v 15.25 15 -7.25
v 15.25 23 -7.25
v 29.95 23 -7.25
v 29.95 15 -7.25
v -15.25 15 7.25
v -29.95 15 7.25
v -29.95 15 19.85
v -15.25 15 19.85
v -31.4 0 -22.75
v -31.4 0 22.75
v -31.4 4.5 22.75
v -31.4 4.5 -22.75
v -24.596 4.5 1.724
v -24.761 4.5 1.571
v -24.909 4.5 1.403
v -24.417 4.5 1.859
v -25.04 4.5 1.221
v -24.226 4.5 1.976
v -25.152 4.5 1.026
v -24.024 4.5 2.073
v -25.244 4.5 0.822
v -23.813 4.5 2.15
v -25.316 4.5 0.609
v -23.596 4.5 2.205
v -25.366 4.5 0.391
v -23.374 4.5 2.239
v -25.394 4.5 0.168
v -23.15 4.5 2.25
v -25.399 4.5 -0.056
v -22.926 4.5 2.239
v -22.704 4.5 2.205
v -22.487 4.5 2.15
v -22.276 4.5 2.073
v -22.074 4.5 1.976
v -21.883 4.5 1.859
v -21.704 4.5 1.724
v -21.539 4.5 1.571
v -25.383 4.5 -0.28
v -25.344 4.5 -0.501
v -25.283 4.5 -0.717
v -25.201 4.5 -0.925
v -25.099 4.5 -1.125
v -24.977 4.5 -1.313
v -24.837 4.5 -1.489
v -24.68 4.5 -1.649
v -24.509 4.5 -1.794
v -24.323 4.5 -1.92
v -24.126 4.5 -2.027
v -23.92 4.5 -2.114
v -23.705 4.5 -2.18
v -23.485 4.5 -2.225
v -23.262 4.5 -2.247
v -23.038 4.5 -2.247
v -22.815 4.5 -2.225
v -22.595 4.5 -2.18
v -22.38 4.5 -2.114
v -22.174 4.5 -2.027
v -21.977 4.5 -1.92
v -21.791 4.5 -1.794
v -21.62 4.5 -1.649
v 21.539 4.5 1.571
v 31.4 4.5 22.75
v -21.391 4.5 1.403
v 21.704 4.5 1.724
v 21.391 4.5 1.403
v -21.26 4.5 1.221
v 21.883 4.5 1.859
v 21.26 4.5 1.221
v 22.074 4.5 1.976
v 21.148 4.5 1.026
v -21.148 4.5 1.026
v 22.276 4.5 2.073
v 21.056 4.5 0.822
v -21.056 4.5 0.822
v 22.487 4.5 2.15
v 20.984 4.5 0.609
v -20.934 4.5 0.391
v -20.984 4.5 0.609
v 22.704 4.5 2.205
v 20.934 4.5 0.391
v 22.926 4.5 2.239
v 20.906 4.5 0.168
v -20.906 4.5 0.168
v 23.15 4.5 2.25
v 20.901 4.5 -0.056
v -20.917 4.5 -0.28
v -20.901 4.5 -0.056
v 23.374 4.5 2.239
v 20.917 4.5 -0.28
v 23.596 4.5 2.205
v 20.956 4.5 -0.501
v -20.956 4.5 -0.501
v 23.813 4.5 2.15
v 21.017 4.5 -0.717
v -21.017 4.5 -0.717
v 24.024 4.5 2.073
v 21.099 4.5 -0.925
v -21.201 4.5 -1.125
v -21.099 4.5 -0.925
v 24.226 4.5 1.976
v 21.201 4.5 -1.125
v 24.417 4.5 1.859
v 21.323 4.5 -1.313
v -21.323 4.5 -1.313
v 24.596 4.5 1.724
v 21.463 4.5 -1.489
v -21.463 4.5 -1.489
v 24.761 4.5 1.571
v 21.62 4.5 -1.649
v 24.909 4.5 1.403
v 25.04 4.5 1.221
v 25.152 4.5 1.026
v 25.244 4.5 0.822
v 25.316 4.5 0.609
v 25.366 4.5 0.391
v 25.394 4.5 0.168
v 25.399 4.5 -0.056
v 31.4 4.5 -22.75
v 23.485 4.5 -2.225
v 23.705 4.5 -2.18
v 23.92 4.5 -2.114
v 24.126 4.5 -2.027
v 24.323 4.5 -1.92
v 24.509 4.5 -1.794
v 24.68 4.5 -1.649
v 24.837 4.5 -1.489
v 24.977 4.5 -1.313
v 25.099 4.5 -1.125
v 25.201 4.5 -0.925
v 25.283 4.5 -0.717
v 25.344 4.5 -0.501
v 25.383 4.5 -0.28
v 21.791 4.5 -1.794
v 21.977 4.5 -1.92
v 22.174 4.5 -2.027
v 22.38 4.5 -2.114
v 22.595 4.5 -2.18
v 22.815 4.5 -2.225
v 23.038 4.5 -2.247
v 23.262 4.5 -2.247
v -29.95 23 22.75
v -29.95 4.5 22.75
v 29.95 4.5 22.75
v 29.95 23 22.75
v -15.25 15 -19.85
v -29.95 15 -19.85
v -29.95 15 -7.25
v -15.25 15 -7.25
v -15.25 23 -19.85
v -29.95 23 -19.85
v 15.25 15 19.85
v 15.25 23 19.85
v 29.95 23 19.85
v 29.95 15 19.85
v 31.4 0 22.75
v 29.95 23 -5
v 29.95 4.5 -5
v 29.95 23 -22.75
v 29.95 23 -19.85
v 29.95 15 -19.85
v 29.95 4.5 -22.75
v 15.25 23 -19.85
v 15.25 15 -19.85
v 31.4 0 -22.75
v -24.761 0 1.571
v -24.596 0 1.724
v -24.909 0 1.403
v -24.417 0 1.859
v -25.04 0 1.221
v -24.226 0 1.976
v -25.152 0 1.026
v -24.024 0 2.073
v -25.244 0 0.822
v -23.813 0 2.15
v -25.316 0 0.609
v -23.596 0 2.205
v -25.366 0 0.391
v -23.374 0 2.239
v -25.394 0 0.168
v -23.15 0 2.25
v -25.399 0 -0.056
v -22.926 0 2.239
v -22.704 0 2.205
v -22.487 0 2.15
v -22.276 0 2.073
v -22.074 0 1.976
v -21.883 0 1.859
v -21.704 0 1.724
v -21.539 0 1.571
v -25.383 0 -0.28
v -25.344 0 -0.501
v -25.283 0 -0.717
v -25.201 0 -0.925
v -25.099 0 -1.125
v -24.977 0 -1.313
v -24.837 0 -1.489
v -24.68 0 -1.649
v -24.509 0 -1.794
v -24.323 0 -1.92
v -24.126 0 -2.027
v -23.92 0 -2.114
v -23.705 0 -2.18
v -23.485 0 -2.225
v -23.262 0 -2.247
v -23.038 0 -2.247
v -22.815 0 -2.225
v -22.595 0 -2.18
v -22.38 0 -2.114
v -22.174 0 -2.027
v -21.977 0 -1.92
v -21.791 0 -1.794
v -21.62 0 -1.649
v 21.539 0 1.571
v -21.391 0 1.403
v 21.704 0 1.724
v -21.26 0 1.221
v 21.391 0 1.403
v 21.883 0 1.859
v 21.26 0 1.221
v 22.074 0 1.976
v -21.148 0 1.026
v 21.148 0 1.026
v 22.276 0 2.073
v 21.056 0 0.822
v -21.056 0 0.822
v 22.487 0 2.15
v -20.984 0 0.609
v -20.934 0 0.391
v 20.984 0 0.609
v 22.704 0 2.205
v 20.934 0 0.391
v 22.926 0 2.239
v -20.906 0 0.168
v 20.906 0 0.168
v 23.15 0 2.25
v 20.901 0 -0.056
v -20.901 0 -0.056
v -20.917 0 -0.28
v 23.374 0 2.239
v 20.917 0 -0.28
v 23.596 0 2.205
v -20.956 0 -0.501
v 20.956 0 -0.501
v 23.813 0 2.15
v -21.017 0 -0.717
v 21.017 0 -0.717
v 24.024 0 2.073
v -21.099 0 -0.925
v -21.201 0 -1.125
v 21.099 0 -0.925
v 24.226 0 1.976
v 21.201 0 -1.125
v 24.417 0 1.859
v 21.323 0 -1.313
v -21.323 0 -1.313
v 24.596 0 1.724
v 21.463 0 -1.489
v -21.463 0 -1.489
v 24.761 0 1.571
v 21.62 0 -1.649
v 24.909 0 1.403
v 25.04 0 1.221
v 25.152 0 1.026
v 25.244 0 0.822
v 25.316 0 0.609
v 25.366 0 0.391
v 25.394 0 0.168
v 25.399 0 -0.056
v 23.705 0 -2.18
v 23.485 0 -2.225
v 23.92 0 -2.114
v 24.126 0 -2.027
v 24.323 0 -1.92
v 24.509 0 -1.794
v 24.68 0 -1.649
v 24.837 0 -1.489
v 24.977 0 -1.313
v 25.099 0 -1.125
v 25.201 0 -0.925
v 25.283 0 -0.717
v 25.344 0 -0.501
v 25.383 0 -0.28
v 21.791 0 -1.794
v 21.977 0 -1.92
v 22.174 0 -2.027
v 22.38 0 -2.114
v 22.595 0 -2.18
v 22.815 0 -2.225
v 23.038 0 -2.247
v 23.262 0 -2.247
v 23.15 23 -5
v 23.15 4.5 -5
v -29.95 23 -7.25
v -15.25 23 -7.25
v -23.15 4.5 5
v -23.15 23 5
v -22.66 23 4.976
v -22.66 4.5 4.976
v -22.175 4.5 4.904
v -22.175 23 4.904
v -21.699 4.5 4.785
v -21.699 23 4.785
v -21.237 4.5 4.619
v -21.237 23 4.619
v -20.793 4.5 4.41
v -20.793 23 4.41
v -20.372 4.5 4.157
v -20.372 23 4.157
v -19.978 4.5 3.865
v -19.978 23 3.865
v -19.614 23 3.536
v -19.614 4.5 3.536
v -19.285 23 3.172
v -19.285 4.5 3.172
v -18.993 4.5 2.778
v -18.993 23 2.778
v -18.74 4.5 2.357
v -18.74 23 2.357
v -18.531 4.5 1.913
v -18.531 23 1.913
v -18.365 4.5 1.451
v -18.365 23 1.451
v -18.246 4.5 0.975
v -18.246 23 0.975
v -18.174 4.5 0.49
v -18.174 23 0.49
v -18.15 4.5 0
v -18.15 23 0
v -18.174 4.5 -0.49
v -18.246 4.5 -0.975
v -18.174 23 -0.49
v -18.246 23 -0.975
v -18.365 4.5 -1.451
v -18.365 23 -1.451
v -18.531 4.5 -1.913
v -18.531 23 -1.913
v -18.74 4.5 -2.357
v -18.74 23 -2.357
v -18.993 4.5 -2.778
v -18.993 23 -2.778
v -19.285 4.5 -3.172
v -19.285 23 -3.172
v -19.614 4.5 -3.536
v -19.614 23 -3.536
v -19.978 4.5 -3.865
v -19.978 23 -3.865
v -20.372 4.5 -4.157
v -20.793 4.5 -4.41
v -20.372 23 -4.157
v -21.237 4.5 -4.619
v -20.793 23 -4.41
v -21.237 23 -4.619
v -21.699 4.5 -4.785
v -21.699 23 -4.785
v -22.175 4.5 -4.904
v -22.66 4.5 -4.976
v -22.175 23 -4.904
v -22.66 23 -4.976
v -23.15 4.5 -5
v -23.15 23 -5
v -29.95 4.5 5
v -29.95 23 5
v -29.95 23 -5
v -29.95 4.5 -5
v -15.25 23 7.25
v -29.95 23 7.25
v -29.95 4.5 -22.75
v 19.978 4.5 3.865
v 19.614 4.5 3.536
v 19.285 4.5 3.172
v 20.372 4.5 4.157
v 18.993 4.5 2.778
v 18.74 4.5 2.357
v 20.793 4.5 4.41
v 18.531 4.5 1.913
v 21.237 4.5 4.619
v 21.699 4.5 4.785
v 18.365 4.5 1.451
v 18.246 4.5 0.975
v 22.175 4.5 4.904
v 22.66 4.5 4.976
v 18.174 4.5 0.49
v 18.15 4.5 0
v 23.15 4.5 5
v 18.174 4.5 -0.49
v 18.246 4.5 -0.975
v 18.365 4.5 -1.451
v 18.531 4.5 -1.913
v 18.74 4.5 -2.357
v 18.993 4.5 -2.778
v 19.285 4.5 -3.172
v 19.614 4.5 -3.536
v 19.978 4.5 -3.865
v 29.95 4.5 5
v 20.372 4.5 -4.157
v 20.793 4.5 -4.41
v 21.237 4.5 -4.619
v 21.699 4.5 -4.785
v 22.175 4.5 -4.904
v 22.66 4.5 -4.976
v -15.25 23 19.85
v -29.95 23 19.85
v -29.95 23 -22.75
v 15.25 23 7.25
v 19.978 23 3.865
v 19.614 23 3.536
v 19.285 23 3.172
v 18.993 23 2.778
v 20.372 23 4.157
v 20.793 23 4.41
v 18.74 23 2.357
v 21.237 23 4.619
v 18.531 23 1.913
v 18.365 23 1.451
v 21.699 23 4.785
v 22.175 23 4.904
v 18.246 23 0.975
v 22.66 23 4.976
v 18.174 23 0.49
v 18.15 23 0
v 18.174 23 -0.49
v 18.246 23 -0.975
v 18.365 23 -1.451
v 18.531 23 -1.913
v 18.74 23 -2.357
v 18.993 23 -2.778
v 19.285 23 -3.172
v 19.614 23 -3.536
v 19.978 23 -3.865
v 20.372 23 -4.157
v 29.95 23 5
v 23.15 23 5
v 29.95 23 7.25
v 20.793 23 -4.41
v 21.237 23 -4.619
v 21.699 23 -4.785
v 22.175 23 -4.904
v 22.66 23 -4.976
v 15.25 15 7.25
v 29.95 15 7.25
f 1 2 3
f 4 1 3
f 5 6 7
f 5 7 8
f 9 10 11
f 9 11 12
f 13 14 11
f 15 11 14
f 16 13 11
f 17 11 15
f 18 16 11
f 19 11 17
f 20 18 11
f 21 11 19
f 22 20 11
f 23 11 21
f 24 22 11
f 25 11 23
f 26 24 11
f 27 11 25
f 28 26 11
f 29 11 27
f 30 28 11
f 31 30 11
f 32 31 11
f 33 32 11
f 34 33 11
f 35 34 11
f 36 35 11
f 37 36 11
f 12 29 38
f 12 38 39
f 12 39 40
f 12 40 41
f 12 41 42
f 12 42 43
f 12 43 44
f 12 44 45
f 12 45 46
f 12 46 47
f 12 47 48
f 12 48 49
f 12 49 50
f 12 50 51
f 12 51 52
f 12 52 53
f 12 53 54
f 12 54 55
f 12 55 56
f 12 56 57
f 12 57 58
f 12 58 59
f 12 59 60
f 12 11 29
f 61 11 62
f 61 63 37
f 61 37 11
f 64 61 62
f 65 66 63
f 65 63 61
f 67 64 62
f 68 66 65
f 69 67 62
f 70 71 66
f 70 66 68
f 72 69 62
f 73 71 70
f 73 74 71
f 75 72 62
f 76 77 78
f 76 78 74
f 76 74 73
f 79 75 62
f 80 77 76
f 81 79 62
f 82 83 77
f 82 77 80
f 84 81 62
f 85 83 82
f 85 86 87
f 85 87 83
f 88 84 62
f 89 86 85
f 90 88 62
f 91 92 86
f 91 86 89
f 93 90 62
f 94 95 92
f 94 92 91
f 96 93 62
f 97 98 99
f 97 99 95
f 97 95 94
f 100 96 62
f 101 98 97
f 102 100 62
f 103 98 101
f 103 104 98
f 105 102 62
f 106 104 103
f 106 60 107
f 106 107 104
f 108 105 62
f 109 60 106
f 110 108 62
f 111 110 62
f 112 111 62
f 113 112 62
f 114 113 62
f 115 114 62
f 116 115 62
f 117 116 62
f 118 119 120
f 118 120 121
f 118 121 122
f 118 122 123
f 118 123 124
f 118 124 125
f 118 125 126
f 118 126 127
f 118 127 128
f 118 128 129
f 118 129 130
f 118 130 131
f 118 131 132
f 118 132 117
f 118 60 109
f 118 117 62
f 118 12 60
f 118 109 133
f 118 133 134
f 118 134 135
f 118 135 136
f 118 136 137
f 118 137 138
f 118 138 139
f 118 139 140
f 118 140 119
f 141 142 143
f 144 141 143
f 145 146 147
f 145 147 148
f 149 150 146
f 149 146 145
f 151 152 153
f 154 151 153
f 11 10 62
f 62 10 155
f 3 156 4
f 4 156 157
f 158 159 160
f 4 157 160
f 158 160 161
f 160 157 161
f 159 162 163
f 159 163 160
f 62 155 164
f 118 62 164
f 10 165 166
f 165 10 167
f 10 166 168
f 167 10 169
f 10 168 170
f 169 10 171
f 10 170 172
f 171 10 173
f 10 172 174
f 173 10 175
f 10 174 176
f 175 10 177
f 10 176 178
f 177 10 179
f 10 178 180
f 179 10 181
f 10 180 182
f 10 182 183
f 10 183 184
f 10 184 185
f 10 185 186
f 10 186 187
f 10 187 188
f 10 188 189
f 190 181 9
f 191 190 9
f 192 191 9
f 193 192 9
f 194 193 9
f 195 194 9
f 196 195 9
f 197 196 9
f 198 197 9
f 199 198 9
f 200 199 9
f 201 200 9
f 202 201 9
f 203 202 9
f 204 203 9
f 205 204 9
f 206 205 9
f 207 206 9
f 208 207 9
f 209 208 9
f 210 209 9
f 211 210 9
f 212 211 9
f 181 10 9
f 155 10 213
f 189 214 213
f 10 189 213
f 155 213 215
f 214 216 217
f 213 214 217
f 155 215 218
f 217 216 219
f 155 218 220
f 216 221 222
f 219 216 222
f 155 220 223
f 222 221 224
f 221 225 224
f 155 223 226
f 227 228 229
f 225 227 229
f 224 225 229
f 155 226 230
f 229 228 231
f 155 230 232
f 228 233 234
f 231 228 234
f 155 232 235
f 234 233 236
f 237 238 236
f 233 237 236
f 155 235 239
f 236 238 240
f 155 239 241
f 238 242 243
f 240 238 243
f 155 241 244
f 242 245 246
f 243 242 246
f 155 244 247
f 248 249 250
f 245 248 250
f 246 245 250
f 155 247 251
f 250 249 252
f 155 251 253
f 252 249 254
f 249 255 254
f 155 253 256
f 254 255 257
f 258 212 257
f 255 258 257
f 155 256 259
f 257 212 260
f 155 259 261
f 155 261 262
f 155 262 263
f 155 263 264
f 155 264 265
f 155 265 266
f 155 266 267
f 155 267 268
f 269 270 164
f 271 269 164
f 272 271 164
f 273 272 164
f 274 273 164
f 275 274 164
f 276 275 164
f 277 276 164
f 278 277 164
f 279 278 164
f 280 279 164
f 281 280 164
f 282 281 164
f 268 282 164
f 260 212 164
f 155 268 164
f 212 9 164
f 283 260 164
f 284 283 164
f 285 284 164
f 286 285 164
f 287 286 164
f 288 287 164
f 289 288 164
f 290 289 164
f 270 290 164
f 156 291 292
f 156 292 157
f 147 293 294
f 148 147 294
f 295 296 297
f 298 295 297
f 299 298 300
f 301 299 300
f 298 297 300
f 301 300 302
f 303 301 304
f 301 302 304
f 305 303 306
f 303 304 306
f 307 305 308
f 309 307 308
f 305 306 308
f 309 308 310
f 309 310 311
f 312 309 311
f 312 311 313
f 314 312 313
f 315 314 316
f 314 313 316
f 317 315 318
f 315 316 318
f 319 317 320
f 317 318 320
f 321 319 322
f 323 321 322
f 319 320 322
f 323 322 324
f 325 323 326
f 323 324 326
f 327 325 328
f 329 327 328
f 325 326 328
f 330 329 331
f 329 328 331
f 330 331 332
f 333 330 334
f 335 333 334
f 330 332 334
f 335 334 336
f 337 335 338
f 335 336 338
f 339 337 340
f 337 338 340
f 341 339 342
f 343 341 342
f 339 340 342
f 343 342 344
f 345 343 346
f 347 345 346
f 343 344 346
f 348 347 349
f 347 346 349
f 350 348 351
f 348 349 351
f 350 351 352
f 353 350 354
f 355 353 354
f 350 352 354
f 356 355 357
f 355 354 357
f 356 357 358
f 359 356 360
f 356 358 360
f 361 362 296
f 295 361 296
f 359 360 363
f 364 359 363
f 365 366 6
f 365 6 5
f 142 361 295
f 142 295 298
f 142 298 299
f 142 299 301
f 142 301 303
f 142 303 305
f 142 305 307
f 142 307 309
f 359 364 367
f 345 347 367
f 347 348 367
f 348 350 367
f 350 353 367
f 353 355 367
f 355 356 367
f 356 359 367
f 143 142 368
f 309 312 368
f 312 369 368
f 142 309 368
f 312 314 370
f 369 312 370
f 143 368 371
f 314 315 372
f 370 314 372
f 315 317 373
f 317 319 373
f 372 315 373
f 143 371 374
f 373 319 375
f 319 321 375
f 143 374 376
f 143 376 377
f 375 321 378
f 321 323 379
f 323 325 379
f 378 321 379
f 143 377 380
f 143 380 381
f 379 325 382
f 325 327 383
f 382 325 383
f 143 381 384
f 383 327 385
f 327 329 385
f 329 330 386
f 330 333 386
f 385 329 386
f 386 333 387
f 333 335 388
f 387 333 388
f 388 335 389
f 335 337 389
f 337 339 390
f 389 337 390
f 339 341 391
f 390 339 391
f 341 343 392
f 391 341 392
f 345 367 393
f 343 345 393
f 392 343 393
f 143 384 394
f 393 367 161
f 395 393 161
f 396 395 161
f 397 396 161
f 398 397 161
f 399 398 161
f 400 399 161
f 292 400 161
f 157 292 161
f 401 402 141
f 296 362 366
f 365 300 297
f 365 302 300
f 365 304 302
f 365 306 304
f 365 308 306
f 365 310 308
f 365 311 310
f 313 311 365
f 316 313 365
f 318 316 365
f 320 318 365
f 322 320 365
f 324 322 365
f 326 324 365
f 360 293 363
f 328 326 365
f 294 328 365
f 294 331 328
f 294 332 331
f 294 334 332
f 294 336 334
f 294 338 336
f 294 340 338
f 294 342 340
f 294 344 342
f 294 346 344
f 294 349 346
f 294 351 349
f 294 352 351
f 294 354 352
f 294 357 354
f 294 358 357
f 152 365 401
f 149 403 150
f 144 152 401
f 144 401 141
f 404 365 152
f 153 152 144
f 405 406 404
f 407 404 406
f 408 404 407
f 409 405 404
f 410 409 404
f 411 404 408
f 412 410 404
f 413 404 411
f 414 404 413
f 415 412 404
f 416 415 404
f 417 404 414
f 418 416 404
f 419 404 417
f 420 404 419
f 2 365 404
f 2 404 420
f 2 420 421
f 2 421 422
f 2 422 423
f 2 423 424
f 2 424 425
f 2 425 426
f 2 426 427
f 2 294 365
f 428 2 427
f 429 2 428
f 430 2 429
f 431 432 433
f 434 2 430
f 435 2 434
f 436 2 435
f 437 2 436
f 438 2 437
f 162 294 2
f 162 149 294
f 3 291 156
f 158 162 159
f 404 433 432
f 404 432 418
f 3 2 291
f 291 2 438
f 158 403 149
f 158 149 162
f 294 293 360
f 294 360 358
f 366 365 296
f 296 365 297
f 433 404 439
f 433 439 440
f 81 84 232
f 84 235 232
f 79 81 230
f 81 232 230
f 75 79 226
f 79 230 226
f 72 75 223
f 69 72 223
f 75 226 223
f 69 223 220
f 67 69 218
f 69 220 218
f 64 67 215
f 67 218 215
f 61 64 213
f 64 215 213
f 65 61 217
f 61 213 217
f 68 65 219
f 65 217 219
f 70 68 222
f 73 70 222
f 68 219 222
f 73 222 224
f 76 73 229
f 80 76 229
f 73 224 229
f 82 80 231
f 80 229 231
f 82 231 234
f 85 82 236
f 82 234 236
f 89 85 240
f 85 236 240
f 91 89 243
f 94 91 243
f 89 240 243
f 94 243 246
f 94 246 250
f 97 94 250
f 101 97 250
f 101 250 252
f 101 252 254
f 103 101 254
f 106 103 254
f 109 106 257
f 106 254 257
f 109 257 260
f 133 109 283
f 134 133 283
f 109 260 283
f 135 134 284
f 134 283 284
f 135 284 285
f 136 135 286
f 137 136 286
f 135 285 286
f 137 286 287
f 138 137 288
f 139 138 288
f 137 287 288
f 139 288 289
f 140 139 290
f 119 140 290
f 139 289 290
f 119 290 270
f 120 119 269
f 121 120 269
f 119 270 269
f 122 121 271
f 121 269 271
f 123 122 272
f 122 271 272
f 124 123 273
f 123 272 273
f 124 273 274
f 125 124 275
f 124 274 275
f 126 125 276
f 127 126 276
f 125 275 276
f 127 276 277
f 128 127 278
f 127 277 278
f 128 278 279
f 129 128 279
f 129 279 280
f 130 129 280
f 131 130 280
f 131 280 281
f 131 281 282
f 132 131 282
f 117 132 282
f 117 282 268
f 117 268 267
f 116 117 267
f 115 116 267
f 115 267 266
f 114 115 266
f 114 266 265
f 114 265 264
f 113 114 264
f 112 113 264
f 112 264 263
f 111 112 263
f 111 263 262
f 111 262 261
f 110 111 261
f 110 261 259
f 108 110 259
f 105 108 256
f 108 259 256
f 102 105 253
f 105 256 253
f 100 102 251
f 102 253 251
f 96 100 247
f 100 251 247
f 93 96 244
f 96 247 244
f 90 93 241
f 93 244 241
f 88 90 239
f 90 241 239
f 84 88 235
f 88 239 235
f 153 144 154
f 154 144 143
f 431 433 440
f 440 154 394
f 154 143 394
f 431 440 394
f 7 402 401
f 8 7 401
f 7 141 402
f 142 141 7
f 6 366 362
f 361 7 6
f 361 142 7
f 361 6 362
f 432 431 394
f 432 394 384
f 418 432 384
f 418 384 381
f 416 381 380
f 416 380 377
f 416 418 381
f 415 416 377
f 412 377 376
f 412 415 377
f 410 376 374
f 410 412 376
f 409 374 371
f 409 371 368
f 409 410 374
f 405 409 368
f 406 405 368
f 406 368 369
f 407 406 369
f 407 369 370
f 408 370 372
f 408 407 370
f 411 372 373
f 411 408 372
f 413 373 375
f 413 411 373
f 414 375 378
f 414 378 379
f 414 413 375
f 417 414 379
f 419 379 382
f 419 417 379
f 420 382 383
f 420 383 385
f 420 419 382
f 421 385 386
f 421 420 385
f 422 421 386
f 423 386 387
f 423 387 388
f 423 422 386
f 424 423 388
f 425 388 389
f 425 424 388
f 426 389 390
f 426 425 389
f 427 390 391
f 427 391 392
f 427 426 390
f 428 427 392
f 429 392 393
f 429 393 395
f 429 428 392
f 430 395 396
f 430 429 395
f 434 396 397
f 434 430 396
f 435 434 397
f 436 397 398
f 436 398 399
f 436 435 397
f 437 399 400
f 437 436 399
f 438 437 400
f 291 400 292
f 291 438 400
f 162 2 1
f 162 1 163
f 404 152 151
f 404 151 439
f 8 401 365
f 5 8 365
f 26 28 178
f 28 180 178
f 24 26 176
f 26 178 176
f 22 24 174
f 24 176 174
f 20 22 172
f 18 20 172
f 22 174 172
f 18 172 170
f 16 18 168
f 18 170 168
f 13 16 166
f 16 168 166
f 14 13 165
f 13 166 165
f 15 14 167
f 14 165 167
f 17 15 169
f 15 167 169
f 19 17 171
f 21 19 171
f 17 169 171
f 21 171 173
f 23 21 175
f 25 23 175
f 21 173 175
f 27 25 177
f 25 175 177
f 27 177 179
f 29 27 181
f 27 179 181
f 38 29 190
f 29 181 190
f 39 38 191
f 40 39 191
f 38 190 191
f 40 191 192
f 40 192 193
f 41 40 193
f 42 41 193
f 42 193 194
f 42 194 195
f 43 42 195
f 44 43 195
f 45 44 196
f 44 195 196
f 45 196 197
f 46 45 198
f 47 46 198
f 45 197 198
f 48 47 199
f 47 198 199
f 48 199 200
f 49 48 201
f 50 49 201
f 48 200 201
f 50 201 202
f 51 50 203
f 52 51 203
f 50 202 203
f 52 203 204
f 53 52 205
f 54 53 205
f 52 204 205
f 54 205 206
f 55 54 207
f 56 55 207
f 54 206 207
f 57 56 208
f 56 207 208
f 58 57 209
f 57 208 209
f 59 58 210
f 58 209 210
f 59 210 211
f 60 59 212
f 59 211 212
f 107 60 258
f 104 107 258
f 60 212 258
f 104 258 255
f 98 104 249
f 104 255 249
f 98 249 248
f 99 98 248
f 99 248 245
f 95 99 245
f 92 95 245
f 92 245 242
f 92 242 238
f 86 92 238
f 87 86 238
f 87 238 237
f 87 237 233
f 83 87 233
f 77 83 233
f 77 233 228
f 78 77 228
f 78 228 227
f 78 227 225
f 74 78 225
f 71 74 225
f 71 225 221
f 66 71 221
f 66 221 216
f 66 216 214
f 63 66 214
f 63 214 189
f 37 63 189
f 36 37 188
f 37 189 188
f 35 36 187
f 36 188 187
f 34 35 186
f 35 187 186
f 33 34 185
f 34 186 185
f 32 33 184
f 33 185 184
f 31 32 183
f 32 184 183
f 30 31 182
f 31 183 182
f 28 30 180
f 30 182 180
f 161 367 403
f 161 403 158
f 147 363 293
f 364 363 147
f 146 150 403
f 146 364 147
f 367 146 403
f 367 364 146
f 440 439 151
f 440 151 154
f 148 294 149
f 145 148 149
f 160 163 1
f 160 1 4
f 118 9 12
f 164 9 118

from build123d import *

# Parameters (mm, degrees)
ESQUISSE1_W               = 62.8
ESQUISSE1_H               = 45.5
BOSS_EXTRU_1_DEPTH        = 4.5
ESQUISSE2_W               = 59.9
ESQUISSE2_H               = 45.5
BOSS_EXTRU_2_DEPTH        = 18.5
ENL_V_MAT_EXTRU_1_DEPTH   = 18.5
ESQUISSE4_W               = 14.7
ESQUISSE4_H               = 12.6
ENL_V_MAT_EXTRU_2_DEPTH   = 8
ESQUISSE6_W               = 2.25
ESQUISSE6_H               = 4.5
D_GAGEMENT_M41_AT_2_COUNT = 2
D_GAGEMENT_M41_AT_2_PITCH = 46.3


with BuildPart() as part:
    # Esquisse1 → Boss.-Extru.1 (new body)
    with BuildSketch(Plane(origin=(0, 0, 0), x_dir=(1, 0, 0), z_dir=(0, 1, 0))):
        Rectangle(ESQUISSE1_W, ESQUISSE1_H)
    extrude(amount=BOSS_EXTRU_1_DEPTH)

    # Esquisse6 → Dégagement M41 (revolve, cut)
    with BuildSketch(Plane(origin=(23.15, 4.5, 0), x_dir=(0, 0, 1), z_dir=(1, 0, 0))):
        with Locations((1.125, 2.25)):
            Rectangle(ESQUISSE6_W, ESQUISSE6_H)
    d_gagement_m41 = revolve(axis=Axis((23.15, 10.85, 0), (0, -1, 0)), mode=Mode.SUBTRACT)

    # Dégagement M41 at 2: Dégagement M41 ×2
    with Locations(*[(-i * D_GAGEMENT_M41_AT_2_PITCH, 0, 0) for i in range(1, D_GAGEMENT_M41_AT_2_COUNT)]):
        add(d_gagement_m41, mode=Mode.SUBTRACT)


with BuildPart() as body_2:
    # Esquisse2 → Boss.-Extru.2 (new body)
    with BuildSketch(Plane(origin=(0, 4.5, 0), x_dir=(1, 0, 0), z_dir=(0, 1, 0))):
        Rectangle(ESQUISSE2_W, ESQUISSE2_H)
    extrude(amount=BOSS_EXTRU_2_DEPTH)

    # Esquisse3 → Enlèv. mat.-Extru.1 (cut)
    with BuildSketch(Plane(origin=(0, 23, 0), x_dir=(1, 0, 0), z_dir=(0, 1, 0))):
        with BuildLine():
            Line((36.75, -5), (23.15, -5))
            ThreePointArc((23.15, -5), (18.15, 0), (23.15, 5))
            Line((23.15, 5), (36.75, 5))
            ThreePointArc((36.75, 5), (41.75, 0), (36.75, -5))
        make_face()
        with BuildLine():
            Line((-36.75, -5), (-23.15, -5))
            ThreePointArc((-23.15, -5), (-18.15, 0), (-23.15, 5))
            Line((-23.15, 5), (-36.75, 5))
            ThreePointArc((-36.75, 5), (-41.75, 0), (-36.75, -5))
        make_face()
    extrude(amount=-ENL_V_MAT_EXTRU_1_DEPTH, mode=Mode.SUBTRACT)

    # Esquisse4 → Enlèv. mat.-Extru.2 (cut)
    with BuildSketch(Plane(origin=(0, 23, 0), x_dir=(1, 0, 0), z_dir=(0, 1, 0))):
        with Locations((22.6, 13.55)):
            Rectangle(ESQUISSE4_W, ESQUISSE4_H)
        with Locations((-22.6, 13.55)):
            Rectangle(ESQUISSE4_W, ESQUISSE4_H)
        with Locations((22.6, -13.55)):
            Rectangle(ESQUISSE4_W, ESQUISSE4_H)
        with Locations((-22.6, -13.55)):
            Rectangle(ESQUISSE4_W, ESQUISSE4_H)
    extrude(amount=-ENL_V_MAT_EXTRU_2_DEPTH, mode=Mode.SUBTRACT)


solid = Compound([part.part, body_2.part])
